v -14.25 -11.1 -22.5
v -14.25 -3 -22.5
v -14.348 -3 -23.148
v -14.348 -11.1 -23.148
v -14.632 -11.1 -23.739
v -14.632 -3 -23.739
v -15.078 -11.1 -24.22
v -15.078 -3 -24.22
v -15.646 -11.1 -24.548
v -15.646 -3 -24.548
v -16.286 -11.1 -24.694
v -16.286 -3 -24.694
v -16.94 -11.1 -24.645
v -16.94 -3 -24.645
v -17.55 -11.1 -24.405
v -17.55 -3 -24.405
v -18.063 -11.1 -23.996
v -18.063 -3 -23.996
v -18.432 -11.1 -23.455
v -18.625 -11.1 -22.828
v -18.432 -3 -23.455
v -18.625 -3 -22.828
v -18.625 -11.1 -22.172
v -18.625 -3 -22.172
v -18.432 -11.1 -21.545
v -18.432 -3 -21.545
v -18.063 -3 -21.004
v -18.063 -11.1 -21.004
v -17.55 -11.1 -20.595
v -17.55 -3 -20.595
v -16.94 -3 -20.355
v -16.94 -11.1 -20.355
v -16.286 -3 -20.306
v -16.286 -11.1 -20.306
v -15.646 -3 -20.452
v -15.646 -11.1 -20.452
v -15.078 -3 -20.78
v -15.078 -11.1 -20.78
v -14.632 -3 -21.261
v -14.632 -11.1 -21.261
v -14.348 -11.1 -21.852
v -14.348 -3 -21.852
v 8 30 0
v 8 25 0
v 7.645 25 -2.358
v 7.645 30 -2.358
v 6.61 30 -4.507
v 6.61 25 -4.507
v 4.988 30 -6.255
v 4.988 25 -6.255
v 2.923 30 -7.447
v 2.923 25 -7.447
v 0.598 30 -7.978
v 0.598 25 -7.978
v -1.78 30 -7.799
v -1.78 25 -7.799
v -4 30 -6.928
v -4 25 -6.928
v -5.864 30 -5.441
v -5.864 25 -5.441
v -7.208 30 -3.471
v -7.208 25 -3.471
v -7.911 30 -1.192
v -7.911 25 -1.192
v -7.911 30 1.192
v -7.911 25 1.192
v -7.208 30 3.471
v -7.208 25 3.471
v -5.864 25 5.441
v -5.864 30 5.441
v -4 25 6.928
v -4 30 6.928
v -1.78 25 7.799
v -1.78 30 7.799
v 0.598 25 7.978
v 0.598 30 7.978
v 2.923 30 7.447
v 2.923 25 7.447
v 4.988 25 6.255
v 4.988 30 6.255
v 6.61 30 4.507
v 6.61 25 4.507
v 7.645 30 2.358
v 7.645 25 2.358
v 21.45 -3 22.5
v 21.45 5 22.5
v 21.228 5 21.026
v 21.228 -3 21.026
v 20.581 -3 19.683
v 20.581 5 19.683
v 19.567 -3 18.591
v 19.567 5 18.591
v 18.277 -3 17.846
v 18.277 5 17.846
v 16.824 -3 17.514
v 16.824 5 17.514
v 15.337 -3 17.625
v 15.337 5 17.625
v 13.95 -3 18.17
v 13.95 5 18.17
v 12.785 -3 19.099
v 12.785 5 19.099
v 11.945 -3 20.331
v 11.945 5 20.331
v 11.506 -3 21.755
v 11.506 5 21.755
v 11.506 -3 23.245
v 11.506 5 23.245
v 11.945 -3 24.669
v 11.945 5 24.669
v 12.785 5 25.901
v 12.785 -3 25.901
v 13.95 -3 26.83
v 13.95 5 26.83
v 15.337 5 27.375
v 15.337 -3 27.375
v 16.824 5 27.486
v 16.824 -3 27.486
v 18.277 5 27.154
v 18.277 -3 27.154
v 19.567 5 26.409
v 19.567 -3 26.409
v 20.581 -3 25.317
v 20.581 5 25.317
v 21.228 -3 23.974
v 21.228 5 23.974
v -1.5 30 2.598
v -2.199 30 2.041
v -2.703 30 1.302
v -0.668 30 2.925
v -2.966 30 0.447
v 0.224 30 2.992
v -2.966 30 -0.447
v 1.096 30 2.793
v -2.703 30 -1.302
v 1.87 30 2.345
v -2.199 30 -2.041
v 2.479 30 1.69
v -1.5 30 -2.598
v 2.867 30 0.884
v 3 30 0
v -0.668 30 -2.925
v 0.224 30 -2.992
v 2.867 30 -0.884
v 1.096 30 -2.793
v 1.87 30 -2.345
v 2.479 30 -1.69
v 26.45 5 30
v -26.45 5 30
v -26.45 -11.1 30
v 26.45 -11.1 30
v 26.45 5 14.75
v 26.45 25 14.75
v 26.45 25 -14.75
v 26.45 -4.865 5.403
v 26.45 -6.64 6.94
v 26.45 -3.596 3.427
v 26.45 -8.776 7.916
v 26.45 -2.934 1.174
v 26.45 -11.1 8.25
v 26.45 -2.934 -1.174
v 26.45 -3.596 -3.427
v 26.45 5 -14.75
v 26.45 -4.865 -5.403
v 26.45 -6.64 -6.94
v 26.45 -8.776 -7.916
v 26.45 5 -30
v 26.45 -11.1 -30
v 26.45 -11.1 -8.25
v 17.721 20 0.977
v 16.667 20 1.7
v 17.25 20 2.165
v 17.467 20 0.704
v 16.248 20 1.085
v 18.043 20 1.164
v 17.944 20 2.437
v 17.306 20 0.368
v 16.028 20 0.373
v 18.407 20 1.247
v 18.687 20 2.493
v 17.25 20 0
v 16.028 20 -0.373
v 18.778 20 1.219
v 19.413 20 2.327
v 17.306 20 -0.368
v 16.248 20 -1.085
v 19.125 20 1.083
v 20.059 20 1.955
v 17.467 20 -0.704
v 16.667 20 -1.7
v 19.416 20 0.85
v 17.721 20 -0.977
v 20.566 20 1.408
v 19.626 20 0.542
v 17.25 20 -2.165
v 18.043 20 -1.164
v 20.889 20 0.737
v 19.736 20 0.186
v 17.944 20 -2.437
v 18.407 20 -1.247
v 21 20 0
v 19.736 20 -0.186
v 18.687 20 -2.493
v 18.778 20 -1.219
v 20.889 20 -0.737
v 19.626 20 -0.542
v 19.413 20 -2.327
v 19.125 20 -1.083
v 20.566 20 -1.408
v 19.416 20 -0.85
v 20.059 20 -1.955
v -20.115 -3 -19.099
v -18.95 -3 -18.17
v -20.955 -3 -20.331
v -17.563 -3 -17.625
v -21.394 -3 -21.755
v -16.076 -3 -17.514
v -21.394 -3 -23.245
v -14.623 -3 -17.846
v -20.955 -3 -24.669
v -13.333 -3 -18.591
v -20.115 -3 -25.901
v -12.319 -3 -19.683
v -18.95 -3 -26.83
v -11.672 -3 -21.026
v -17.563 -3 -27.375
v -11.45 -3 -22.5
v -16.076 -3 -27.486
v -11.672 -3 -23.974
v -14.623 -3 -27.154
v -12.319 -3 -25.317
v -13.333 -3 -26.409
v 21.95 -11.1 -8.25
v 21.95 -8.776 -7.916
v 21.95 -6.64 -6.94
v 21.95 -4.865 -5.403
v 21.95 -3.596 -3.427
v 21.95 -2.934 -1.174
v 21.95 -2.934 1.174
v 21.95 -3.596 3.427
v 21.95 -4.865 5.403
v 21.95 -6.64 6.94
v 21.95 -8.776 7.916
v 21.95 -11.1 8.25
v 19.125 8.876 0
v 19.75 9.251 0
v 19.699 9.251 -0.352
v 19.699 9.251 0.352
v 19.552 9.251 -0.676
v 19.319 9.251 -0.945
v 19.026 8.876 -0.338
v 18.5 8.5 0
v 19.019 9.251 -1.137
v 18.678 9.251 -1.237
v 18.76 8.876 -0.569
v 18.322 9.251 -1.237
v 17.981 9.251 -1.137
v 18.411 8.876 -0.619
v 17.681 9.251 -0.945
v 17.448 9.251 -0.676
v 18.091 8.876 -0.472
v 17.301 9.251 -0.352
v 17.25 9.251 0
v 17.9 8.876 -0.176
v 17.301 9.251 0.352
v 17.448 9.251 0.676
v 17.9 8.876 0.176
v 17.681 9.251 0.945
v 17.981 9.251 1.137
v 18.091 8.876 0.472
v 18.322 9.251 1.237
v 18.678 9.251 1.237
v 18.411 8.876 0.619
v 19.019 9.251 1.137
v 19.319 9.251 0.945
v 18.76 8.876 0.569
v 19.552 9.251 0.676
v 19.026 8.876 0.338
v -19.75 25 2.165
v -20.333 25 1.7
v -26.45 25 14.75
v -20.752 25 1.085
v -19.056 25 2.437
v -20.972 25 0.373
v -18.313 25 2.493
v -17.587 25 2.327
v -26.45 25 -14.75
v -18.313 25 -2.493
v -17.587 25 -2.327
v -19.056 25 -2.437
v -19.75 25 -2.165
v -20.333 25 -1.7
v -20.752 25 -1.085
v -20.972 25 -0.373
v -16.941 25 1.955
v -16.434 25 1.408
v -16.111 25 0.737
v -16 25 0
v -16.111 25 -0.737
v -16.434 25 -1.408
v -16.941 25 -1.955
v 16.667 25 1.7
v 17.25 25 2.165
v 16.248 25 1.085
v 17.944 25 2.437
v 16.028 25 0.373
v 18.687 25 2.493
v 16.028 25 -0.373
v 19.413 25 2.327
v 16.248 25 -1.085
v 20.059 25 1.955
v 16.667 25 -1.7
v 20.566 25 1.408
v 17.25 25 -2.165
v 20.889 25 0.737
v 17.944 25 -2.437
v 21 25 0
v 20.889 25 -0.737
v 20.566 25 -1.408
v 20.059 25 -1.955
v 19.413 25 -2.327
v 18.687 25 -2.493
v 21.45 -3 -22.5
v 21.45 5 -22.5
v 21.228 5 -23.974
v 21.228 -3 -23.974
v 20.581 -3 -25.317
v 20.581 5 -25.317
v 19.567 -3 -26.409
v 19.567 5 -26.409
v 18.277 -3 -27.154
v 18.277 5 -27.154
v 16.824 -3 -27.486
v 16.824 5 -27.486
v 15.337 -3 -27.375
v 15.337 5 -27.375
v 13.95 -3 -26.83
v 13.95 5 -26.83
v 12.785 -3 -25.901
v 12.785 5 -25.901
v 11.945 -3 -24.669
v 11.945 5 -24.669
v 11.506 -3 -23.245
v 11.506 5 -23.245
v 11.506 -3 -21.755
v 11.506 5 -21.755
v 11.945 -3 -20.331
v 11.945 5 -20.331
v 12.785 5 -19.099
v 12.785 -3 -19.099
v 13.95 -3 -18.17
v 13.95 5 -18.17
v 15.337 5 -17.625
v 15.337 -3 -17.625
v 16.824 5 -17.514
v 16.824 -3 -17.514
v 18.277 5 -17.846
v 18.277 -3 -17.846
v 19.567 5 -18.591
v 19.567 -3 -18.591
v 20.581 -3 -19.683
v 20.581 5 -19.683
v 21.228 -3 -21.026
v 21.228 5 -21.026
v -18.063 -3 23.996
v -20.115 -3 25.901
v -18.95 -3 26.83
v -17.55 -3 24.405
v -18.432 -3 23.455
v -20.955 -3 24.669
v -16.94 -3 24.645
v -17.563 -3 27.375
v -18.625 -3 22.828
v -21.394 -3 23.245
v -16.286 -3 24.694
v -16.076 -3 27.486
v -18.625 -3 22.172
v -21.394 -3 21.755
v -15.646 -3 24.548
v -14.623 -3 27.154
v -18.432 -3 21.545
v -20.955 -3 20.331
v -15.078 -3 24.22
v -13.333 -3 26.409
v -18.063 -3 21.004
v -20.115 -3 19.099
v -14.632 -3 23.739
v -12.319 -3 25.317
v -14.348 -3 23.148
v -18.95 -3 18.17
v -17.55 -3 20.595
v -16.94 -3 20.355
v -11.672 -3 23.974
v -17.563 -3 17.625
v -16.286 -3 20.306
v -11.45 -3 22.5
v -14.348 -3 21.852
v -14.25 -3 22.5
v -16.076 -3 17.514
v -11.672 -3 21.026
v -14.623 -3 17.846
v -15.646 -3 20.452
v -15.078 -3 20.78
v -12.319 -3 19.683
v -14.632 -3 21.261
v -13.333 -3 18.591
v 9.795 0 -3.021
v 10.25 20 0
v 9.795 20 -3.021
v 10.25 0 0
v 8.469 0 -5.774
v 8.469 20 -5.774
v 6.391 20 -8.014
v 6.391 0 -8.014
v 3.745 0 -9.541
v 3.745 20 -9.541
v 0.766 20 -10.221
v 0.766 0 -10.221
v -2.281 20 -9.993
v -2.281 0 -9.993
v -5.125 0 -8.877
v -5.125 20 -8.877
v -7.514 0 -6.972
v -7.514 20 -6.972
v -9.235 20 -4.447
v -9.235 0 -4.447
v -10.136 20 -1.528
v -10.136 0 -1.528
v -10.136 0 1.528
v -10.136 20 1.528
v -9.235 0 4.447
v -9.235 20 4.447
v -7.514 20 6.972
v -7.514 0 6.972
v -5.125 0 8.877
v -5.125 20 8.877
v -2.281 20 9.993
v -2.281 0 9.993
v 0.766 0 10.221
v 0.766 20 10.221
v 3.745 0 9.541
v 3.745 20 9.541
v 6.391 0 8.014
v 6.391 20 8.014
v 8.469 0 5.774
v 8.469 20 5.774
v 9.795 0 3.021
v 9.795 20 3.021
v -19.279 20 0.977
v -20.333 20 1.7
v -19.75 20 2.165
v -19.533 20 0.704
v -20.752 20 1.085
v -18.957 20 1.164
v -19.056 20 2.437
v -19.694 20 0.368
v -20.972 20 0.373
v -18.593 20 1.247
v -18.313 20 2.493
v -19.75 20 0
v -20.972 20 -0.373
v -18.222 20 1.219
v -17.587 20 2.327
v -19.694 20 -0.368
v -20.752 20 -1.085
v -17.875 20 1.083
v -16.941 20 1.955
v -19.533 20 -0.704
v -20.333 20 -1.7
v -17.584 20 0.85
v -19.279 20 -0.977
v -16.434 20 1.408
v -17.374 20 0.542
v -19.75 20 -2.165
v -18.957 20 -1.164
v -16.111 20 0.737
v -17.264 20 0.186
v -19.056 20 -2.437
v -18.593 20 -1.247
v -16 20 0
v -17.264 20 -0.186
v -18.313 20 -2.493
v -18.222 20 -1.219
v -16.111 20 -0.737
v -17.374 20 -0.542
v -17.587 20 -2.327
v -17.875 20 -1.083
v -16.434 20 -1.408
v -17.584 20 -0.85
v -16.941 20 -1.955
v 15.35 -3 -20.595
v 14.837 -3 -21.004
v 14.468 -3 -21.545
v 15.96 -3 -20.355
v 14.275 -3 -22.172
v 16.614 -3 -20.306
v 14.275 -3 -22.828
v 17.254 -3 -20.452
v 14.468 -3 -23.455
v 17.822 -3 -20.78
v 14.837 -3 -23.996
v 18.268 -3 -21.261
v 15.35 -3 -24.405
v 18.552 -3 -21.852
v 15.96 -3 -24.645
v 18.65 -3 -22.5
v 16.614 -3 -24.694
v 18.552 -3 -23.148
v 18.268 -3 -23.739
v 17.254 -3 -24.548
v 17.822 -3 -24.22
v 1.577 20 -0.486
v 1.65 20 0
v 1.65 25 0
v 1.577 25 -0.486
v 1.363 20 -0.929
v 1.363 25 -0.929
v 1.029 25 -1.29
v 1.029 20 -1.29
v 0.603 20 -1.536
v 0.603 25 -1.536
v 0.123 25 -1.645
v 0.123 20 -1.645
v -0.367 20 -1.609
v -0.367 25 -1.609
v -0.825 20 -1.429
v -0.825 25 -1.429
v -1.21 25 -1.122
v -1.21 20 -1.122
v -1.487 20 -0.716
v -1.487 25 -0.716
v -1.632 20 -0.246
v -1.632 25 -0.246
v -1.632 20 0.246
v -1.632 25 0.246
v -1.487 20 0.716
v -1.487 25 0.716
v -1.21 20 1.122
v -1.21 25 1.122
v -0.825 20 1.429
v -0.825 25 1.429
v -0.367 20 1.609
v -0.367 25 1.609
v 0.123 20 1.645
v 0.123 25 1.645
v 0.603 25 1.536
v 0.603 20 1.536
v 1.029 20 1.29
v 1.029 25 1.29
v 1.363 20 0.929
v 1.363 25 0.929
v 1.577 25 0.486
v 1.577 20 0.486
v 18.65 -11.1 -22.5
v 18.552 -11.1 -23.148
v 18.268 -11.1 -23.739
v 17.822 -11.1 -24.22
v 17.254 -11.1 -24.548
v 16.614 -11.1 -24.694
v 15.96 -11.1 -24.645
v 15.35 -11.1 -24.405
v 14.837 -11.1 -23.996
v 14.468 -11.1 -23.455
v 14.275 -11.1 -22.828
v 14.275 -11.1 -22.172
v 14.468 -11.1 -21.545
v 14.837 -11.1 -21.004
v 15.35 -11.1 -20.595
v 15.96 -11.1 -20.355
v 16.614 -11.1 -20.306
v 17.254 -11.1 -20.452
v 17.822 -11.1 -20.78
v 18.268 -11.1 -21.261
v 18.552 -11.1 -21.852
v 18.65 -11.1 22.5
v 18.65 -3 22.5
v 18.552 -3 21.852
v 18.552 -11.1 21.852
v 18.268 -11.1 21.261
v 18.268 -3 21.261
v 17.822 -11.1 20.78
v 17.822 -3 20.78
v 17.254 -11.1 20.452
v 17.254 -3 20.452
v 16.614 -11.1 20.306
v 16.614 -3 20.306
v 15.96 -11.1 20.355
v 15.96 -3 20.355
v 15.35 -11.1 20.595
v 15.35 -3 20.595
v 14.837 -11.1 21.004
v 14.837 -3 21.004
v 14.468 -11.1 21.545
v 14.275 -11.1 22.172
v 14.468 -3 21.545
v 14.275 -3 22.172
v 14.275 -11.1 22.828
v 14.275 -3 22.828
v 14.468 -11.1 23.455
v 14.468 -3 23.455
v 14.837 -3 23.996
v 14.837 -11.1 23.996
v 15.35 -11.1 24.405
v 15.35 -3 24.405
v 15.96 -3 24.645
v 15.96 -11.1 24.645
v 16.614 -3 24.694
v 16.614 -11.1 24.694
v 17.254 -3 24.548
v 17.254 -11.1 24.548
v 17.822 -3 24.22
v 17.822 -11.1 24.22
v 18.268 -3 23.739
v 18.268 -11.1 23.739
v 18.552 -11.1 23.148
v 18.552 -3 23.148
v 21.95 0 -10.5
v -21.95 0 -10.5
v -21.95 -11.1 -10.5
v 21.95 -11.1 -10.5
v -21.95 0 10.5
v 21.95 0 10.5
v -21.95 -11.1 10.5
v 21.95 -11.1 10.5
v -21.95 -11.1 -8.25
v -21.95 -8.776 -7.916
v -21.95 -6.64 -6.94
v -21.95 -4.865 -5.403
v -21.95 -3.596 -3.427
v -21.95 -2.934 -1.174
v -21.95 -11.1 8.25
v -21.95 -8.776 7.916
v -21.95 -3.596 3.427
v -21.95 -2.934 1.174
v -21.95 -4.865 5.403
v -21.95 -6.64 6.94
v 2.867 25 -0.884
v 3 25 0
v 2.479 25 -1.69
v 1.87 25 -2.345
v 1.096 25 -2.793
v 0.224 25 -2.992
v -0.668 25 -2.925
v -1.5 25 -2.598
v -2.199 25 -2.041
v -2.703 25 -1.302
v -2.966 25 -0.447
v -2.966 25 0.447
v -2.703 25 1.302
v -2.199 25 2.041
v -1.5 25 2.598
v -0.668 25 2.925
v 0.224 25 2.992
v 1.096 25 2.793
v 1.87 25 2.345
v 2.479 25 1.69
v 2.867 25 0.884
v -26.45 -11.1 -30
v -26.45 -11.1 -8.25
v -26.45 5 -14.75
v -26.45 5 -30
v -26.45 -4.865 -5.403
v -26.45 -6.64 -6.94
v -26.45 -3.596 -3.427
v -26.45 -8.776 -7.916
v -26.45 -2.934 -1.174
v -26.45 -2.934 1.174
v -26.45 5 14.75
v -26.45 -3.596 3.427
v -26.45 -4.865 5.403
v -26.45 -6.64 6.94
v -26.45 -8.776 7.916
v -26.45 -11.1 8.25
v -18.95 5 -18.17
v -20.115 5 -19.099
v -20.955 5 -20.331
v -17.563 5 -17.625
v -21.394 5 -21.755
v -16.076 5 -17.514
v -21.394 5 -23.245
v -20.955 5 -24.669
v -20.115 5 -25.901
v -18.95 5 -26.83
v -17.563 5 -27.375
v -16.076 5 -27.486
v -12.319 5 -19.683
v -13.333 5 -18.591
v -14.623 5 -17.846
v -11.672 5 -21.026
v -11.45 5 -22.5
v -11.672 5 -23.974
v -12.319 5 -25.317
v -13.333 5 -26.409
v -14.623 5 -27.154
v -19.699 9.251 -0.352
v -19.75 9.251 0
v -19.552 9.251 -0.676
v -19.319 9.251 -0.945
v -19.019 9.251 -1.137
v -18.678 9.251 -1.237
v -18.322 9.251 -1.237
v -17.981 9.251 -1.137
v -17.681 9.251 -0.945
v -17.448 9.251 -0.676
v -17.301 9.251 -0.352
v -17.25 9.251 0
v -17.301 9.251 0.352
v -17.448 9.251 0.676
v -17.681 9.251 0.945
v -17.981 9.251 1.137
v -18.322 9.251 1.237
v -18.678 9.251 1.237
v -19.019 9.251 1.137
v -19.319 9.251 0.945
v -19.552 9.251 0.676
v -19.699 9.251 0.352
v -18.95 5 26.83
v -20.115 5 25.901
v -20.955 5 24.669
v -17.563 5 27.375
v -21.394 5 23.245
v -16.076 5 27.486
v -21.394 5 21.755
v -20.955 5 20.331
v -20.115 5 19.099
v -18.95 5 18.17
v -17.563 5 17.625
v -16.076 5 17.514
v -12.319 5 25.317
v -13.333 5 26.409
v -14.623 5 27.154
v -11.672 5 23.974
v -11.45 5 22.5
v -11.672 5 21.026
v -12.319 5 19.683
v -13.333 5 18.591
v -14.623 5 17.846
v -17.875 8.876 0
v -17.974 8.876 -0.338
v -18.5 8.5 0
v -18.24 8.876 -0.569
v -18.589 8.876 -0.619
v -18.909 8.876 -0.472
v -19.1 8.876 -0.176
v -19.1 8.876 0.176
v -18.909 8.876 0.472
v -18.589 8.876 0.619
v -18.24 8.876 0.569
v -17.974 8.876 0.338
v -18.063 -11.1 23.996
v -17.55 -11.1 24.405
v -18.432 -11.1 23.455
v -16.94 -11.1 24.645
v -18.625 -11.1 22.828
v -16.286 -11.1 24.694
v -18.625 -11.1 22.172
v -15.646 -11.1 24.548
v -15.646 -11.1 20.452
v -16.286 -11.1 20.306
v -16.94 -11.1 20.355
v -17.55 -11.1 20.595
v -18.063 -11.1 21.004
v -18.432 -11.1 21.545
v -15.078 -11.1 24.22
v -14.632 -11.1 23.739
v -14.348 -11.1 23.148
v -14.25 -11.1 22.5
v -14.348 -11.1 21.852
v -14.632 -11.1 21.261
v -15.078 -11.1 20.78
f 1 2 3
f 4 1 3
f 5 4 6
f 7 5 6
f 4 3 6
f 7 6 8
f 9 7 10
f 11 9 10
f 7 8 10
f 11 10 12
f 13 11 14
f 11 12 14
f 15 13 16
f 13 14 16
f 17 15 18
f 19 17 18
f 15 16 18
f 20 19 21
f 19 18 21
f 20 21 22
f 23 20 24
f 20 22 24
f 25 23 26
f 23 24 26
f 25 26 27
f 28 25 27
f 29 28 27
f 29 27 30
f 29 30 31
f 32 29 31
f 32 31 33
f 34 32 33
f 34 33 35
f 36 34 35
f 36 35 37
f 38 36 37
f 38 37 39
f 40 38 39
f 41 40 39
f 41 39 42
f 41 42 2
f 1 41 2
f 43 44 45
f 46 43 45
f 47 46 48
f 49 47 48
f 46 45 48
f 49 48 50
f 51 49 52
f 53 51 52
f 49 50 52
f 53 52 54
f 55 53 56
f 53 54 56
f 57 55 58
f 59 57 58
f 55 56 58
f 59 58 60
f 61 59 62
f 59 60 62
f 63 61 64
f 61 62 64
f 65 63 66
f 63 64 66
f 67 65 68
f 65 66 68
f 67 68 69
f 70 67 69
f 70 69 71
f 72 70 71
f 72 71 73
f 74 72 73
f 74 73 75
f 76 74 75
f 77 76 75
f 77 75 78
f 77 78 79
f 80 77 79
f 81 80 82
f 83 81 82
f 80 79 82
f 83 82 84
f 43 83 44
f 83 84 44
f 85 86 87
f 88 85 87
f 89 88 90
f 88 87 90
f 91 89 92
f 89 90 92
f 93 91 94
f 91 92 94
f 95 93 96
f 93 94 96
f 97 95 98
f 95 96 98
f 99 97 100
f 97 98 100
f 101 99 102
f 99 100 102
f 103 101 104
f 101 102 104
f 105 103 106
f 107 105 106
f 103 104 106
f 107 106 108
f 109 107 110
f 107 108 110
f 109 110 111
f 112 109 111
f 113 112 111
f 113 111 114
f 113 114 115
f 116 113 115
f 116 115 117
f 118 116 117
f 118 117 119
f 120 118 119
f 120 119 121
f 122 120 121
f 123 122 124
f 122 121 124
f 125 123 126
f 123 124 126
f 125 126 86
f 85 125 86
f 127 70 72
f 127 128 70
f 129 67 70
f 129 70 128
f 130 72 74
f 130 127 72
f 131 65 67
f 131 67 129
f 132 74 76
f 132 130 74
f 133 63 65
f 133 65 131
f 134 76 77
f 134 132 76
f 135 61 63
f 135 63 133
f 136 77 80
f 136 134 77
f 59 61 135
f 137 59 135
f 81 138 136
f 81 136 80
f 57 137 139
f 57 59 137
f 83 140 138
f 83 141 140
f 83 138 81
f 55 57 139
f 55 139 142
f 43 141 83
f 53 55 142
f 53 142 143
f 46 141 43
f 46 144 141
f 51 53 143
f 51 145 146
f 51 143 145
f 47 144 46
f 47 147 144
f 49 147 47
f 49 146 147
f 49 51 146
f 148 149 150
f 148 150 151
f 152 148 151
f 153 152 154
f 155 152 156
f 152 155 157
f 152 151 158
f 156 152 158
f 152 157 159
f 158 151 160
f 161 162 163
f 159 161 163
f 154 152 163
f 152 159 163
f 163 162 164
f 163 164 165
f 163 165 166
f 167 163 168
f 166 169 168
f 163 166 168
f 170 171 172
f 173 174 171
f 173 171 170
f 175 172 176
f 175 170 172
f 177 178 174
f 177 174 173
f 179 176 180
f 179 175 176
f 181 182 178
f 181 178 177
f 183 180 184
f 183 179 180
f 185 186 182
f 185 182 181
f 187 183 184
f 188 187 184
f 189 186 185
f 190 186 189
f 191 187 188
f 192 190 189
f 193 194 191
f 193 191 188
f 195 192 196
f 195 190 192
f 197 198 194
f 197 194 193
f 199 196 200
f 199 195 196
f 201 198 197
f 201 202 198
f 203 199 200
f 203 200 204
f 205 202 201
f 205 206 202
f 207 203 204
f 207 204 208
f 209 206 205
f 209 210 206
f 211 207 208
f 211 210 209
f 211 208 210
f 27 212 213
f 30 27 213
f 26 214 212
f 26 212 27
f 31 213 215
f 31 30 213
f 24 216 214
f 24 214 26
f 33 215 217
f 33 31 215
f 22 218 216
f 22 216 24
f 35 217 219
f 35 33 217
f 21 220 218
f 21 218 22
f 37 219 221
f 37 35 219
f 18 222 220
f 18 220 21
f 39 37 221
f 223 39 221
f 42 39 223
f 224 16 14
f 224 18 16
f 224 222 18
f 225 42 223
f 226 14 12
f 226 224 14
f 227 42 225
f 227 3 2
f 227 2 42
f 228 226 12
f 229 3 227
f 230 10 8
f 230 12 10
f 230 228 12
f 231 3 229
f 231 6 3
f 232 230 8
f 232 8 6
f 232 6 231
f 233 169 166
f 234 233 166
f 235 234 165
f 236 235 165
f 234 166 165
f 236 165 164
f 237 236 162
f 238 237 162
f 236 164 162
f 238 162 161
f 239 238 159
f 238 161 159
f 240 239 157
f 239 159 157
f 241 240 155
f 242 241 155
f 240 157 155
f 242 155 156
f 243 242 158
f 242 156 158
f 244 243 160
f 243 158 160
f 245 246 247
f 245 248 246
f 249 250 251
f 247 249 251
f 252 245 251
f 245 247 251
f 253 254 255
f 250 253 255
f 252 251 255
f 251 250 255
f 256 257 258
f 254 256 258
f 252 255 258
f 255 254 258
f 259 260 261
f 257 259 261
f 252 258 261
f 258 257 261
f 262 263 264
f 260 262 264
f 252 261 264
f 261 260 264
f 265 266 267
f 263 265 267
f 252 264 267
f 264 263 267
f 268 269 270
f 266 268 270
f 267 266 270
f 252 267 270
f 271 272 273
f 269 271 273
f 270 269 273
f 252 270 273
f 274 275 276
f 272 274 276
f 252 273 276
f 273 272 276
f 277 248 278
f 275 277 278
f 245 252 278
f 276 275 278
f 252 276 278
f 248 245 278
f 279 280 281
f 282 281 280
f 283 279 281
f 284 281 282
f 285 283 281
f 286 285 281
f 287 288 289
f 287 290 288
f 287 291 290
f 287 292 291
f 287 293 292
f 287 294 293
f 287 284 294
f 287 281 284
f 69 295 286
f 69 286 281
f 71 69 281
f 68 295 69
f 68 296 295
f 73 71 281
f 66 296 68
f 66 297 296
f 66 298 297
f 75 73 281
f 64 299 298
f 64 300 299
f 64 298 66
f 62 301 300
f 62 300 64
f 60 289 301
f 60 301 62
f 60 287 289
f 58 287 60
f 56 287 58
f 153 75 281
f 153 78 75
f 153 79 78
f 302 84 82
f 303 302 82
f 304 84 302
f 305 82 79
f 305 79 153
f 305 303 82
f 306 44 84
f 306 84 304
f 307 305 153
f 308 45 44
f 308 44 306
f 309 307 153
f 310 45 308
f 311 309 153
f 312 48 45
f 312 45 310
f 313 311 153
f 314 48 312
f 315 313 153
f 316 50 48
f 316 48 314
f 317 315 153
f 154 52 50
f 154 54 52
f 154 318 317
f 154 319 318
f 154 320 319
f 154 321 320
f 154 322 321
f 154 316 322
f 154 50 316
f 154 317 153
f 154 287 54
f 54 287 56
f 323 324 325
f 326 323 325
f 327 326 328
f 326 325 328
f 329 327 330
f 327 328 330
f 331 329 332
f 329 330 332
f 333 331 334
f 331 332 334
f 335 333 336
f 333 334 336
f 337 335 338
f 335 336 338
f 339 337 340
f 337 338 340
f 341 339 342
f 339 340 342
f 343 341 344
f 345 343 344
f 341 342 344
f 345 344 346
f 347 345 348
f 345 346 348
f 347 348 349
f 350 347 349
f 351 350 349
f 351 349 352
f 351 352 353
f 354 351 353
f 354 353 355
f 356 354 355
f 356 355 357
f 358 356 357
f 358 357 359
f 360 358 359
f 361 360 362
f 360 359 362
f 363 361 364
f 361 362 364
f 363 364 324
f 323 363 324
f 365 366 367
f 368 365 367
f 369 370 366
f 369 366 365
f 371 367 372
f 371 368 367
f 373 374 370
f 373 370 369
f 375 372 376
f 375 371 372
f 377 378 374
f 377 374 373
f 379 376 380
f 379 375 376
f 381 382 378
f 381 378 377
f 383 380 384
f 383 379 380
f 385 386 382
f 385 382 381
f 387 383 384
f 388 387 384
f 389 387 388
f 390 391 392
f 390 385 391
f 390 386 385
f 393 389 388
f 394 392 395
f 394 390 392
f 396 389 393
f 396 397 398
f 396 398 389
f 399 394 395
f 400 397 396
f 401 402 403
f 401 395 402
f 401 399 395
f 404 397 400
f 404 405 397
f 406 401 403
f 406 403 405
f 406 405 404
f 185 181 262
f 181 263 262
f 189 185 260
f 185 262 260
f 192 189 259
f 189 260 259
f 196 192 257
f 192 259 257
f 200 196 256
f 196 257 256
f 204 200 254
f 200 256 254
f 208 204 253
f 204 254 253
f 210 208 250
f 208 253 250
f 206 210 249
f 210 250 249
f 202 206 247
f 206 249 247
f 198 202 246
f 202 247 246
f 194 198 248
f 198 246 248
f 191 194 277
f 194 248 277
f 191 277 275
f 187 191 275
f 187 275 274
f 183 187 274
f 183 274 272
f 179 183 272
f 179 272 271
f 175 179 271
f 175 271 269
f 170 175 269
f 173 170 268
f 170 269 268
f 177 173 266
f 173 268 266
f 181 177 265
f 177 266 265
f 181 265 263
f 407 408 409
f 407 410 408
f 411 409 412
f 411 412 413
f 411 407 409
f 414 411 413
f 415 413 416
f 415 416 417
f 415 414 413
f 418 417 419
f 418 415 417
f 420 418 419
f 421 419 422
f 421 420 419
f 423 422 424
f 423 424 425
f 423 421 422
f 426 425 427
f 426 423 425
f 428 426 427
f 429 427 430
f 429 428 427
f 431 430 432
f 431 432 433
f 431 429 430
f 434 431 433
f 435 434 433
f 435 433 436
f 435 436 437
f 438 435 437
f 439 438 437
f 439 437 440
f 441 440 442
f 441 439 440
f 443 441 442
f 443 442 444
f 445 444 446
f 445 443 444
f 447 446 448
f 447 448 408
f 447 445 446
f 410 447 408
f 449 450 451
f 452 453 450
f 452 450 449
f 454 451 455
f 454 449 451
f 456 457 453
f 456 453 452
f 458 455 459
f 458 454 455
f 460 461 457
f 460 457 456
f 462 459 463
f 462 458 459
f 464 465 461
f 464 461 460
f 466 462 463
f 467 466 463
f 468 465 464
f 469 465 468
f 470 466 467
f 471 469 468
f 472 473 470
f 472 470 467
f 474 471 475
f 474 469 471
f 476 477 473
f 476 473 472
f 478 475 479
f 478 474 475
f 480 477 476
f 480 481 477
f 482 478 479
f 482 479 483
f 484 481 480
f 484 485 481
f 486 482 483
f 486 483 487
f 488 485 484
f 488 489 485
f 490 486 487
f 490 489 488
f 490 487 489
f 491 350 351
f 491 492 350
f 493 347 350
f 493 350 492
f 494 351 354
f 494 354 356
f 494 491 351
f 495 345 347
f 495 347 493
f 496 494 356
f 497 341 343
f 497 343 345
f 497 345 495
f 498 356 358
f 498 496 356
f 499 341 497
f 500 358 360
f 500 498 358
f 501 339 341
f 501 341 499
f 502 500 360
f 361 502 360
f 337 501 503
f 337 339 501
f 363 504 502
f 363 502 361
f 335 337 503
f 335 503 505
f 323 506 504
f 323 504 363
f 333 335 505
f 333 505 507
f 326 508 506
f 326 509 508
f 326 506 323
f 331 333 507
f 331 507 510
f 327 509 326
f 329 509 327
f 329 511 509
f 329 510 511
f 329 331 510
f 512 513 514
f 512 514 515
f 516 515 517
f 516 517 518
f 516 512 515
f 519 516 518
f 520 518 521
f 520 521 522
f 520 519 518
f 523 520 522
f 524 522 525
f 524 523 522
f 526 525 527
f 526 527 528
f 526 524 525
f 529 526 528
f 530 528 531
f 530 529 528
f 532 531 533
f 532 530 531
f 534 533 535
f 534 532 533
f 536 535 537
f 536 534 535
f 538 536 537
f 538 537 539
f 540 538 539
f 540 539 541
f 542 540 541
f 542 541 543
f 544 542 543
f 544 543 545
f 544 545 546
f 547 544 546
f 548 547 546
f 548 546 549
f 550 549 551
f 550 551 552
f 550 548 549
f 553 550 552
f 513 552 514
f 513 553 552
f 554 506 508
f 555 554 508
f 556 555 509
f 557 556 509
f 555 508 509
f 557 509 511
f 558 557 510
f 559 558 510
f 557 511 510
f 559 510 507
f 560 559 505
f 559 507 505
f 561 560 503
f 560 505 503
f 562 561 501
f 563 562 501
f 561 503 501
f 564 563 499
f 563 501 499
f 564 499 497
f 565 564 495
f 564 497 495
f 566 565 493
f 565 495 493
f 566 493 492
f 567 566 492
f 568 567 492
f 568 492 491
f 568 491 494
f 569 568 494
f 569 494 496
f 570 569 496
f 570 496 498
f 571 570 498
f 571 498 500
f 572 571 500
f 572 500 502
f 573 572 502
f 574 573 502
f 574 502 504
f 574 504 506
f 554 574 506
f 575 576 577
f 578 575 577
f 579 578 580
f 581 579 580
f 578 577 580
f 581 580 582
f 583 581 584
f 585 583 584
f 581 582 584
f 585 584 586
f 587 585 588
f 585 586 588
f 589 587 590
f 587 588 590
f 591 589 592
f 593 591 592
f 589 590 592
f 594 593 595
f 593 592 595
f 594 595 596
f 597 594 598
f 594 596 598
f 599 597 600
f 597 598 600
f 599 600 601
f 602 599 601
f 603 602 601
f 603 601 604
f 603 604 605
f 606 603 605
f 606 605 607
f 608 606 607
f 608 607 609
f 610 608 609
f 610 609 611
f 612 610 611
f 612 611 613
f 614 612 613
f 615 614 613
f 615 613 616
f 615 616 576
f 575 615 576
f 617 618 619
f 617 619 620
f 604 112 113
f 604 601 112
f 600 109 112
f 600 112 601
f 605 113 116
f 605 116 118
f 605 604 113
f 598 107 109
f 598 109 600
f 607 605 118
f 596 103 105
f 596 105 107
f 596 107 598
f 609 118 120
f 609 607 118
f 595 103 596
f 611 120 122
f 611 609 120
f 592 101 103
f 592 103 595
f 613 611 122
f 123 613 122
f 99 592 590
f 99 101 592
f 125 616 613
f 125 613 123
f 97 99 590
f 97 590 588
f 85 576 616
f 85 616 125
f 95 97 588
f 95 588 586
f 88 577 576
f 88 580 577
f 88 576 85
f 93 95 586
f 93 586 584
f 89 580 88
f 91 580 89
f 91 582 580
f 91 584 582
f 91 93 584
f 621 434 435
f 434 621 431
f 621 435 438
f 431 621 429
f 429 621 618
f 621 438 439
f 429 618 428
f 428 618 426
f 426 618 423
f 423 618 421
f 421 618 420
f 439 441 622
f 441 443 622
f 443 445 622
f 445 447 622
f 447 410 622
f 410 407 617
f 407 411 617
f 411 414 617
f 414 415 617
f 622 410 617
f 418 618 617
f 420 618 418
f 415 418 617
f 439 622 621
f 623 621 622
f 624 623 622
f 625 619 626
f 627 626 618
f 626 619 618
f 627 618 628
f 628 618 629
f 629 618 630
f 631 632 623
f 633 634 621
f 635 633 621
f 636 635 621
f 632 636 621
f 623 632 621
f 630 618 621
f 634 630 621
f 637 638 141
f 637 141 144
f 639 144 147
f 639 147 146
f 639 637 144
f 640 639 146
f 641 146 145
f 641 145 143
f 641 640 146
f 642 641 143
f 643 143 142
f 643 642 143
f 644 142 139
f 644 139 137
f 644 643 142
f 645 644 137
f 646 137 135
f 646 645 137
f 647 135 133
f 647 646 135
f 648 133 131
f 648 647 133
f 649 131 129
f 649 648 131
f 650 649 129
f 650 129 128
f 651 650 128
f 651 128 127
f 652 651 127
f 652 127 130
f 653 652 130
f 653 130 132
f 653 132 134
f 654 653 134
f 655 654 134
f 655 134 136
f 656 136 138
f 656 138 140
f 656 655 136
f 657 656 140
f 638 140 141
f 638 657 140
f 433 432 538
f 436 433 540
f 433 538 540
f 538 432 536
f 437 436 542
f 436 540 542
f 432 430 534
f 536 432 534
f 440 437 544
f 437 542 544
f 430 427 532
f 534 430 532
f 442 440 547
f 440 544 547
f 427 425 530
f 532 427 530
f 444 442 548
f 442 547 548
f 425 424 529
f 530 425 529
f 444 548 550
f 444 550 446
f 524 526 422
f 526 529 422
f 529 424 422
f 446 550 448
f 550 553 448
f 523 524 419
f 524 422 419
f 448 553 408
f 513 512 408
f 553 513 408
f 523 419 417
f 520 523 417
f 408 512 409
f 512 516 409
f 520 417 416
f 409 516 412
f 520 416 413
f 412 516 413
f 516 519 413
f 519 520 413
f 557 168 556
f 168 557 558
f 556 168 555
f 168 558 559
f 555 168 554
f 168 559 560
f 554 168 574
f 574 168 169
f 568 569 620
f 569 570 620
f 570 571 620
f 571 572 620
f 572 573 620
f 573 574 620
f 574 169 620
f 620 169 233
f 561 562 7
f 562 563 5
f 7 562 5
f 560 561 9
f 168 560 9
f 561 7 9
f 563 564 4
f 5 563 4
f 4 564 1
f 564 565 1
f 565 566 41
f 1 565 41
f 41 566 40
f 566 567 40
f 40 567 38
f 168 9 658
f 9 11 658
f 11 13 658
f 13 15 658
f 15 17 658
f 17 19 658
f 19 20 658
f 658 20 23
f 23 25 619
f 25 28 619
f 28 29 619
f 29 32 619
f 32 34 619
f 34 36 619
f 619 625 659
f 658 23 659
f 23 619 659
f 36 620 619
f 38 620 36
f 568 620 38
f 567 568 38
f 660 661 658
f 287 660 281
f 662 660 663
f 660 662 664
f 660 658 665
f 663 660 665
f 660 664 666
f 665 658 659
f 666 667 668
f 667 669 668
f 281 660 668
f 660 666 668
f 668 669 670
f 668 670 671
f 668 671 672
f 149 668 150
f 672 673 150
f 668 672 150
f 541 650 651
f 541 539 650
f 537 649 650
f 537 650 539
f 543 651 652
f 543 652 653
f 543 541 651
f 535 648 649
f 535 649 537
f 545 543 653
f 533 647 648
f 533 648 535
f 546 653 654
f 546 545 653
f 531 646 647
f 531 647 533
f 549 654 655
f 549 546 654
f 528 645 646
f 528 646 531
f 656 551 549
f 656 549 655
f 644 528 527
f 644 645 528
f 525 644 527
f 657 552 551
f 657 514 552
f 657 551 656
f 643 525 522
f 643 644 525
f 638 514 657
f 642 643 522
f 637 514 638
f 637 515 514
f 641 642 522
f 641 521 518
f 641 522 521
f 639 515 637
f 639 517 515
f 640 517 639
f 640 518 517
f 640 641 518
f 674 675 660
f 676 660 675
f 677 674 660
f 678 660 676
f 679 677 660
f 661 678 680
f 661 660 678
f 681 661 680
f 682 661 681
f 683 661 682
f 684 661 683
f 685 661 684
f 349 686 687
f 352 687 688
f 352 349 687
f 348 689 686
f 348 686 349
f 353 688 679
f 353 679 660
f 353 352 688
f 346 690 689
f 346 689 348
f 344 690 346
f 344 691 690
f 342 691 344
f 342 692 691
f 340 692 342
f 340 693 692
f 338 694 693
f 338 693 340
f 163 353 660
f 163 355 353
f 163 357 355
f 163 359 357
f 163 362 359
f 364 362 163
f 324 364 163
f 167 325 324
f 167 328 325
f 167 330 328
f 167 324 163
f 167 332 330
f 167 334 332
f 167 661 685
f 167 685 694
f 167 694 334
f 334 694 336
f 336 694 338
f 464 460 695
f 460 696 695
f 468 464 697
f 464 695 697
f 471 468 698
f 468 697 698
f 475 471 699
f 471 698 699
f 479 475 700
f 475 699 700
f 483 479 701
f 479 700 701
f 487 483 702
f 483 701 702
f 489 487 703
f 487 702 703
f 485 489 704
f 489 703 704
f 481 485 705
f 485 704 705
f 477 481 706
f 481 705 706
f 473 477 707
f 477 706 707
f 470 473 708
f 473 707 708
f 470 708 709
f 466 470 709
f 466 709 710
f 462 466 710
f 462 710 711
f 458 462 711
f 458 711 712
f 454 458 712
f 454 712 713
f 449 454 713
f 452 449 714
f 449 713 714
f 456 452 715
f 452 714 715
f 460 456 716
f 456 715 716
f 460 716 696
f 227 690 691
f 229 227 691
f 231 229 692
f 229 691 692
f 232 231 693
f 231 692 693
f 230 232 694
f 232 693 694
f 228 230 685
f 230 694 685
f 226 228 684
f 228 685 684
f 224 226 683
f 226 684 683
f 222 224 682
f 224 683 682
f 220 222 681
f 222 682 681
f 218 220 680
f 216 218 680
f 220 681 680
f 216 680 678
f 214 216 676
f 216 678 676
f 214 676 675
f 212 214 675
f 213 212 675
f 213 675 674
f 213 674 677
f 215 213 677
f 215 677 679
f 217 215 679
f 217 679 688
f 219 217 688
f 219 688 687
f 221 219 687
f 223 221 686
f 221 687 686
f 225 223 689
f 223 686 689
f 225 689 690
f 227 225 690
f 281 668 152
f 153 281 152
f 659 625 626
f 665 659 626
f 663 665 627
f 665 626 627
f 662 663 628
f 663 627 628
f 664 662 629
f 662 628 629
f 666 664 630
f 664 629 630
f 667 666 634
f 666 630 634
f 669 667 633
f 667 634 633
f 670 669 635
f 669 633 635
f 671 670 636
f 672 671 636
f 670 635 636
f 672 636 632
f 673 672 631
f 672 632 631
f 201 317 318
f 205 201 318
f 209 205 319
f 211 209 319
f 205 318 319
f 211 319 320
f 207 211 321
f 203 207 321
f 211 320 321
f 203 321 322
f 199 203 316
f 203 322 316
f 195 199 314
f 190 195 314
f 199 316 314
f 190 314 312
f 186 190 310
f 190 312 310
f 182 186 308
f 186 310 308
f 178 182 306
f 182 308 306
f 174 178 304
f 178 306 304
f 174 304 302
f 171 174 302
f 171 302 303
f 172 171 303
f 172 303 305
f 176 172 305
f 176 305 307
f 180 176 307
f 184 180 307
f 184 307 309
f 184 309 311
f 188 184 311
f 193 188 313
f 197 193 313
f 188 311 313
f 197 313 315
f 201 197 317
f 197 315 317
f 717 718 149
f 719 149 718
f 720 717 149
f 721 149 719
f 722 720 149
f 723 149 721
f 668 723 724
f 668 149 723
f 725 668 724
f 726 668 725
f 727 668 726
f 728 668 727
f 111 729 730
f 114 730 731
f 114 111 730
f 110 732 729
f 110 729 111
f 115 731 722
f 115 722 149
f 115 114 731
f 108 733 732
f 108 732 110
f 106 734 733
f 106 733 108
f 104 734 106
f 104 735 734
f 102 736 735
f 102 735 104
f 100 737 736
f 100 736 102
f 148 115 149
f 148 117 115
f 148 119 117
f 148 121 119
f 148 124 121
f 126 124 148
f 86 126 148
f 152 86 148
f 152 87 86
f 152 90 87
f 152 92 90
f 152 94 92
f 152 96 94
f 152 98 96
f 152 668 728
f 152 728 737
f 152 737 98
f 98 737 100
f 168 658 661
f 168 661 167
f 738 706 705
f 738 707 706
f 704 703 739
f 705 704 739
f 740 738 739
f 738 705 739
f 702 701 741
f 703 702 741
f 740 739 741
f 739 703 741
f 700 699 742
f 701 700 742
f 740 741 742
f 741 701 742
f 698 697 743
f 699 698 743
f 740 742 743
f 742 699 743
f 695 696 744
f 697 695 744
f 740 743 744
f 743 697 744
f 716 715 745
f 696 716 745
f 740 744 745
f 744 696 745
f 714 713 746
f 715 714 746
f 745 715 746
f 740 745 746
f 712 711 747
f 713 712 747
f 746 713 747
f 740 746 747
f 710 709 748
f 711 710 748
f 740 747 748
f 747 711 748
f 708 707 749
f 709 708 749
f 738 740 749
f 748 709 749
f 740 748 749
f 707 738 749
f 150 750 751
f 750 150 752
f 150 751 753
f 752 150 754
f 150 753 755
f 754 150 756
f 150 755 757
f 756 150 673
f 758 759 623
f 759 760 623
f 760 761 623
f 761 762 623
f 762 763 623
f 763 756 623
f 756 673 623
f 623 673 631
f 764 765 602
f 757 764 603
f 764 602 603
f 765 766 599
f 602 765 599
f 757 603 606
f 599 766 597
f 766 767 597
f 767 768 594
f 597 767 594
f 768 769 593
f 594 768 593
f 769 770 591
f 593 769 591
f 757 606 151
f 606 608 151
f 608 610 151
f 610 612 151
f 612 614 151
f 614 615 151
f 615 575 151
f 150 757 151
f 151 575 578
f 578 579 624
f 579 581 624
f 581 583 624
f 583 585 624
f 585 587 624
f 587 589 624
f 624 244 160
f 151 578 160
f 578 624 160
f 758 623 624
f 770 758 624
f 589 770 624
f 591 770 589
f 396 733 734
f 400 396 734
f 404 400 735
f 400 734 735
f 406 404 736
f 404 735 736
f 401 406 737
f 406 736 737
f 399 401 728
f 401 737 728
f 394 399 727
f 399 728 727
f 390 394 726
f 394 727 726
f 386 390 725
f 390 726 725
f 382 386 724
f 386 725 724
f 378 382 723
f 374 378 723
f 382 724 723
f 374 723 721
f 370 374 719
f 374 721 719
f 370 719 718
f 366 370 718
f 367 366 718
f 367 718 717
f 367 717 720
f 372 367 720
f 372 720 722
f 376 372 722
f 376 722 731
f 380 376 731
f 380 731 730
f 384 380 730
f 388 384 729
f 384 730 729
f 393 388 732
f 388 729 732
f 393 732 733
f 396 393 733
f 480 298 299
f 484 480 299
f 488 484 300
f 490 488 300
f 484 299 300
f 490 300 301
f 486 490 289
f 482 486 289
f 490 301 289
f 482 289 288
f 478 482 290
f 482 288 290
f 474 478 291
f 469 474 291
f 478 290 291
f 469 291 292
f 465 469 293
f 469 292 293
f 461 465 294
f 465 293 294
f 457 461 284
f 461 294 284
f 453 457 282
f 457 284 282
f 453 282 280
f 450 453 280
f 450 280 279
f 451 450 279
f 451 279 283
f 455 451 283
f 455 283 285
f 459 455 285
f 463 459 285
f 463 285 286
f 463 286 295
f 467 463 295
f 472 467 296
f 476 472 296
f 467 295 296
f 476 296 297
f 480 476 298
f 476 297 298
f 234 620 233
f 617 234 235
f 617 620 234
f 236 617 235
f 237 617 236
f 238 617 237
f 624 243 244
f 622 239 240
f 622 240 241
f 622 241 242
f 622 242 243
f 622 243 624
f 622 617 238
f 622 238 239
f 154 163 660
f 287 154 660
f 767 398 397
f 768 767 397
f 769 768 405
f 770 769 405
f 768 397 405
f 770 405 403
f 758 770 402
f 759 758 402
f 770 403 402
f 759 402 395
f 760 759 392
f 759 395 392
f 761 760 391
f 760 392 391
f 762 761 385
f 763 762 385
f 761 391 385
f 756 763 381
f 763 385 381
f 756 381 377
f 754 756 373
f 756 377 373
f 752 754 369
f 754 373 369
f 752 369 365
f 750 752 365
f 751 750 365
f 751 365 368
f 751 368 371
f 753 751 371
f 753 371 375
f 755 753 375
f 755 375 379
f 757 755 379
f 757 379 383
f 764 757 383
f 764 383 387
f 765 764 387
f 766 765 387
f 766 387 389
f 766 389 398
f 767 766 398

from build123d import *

# Parameters (mm, degrees)
SKETCH1_W             = 52.9
SKETCH1_H             = 30
SKETCH1_R             = 10.25
BOSS_EXTRUDE1_DEPTH   = 5
SKETCH2_W             = 52.9
SKETCH2_H             = 30
SKETCH2_W_2           = 43.9
SKETCH2_H_2           = 21
BOSS_EXTRUDE2_DEPTH   = 11.1
SKETCH3_R             = 8.25
CUT_EXTRUDE1_DEPTH    = 53.9
SKETCH4_W             = 52.9
SKETCH4_H             = 5
BOSS_EXTRUDE3_DEPTH   = 15
SKETCH5_W             = 52.9
SKETCH5_H             = 5
BOSS_EXTRUDE4_DEPTH   = 15
SKETCH7_R             = 14.75
SKETCH7_R_2           = 10.25
BOSS_EXTRUDE5_DEPTH   = 15
SKETCH8_R             = 14.75
SKETCH8_R_2           = 1.65
BOSS_EXTRUDE6_DEPTH   = 5
SKETCH9_R             = 8
SKETCH9_R_2           = 3
BOSS_EXTRUDE7_DEPTH   = 5
SKETCH10_W            = 52.9
SKETCH10_H            = 15
BOSS_EXTRUDE8_DEPTH   = 11.1
SKETCH12_R            = 5
CUT_EXTRUDE2_DEPTH    = 8
SKETCH13_R            = 2.2
CUT_EXTRUDE3_DEPTH    = 9.1
BOSS_EXTRUDE11_DEPTH  = 20
SKETCH16_R            = 2.5
CUT_EXTRUDE4_DEPTH    = 5
M3_TAPPED_HOLE1_D     = 2.5
M3_TAPPED_HOLE1_DEPTH = 10.748924226
M3_TAPPED_HOLE1_TIP   = 0.751075774


with BuildPart() as part:
    # Sketch1 → Boss-Extrude1 (new body)
    with BuildSketch(Plane(origin=(0, 0, 0), x_dir=(1, 0, 0), z_dir=(0, 1, 0))):
        Rectangle(SKETCH1_W, SKETCH1_H)
        Circle(SKETCH1_R, mode=Mode.SUBTRACT)
    extrude(amount=BOSS_EXTRUDE1_DEPTH)

    # Sketch2 → Boss-Extrude2 (add)
    with BuildSketch(Plane.XZ):
        Rectangle(SKETCH2_W, SKETCH2_H)
        Rectangle(SKETCH2_W_2, SKETCH2_H_2, mode=Mode.SUBTRACT)
    extrude(amount=BOSS_EXTRUDE2_DEPTH)

    # Sketch3 → Cut-Extrude1 (cut, through all)
    with BuildSketch(Plane(origin=(26.45, 0, 0), x_dir=(0, 0, -1), z_dir=(1, 0, 0))):
        with Locations((0, -11.1)):
            Circle(SKETCH3_R)
    extrude(amount=-CUT_EXTRUDE1_DEPTH, mode=Mode.SUBTRACT)

    # Sketch4 → Boss-Extrude3 (add)
    with BuildSketch(Plane(origin=(0, 0, -15), x_dir=(-1, 0, 0), z_dir=(0, 0, -1))):
        with Locations((0, -8.6)):
            Rectangle(SKETCH4_W, SKETCH4_H)
    extrude(amount=BOSS_EXTRUDE3_DEPTH)

    # Sketch5 → Boss-Extrude4 (add)
    with BuildSketch(Plane.XY.offset(15)):
        with Locations((0, -8.6)):
            Rectangle(SKETCH5_W, SKETCH5_H)
    extrude(amount=BOSS_EXTRUDE4_DEPTH)

    # Sketch7 → Boss-Extrude5 (add)
    with BuildSketch(Plane(origin=(0, 5, 0), x_dir=(1, 0, 0), z_dir=(0, 1, 0))):
        Circle(SKETCH7_R)
        Circle(SKETCH7_R_2, mode=Mode.SUBTRACT)
    extrude(amount=BOSS_EXTRUDE5_DEPTH)

    # Sketch8 → Boss-Extrude6 (add)
    with BuildSketch(Plane(origin=(0, 20, 0), x_dir=(1, 0, 0), z_dir=(0, 1, 0))):
        Circle(SKETCH8_R)
        Circle(SKETCH8_R_2, mode=Mode.SUBTRACT)
    extrude(amount=BOSS_EXTRUDE6_DEPTH)

    # Sketch9 → Boss-Extrude7 (add)
    with BuildSketch(Plane(origin=(0, 25, 0), x_dir=(1, 0, 0), z_dir=(0, 1, 0))):
        Circle(SKETCH9_R)
        Circle(SKETCH9_R_2, mode=Mode.SUBTRACT)
    extrude(amount=BOSS_EXTRUDE7_DEPTH)

    # Sketch10 → Boss-Extrude8 (add)
    with BuildSketch(Plane(origin=(0, -6.1, 0), x_dir=(1, 0, 0), z_dir=(0, 1, 0))):
        with Locations((0, 22.5)):
            Rectangle(SKETCH10_W, SKETCH10_H)
        with Locations((0, -22.5)):
            Rectangle(SKETCH10_W, SKETCH10_H)
    extrude(amount=BOSS_EXTRUDE8_DEPTH)

    # Sketch12 → Cut-Extrude2 (cut)
    with BuildSketch(Plane(origin=(0, 5, 0), x_dir=(1, 0, 0), z_dir=(0, 1, 0))):
        with Locations((-16.45, -22.5)):
            Circle(SKETCH12_R)
        with Locations((16.45, -22.5)):
            Circle(SKETCH12_R)
        with Locations((16.45, 22.5)):
            Circle(SKETCH12_R)
        with Locations((-16.45, 22.5)):
            Circle(SKETCH12_R)
    extrude(amount=-CUT_EXTRUDE2_DEPTH, mode=Mode.SUBTRACT)

    # Sketch13 → Cut-Extrude3 (cut, through all)
    with BuildSketch(Plane(origin=(0, -3, 0), x_dir=(1, 0, 0), z_dir=(0, 1, 0))):
        with Locations((-16.45, -22.5)):
            Circle(SKETCH13_R)
        with Locations((-16.45, 22.5)):
            Circle(SKETCH13_R)
        with Locations((16.45, 22.5)):
            Circle(SKETCH13_R)
        with Locations((16.45, -22.5)):
            Circle(SKETCH13_R)
    extrude(amount=-CUT_EXTRUDE3_DEPTH, mode=Mode.SUBTRACT)

    # Sketch14 → Boss-Extrude11 (add)
    with BuildSketch(Plane(origin=(0, 5, 0), x_dir=(1, 0, 0), z_dir=(0, 1, 0))):
        with BuildLine():
            Line((-26.45, 14.75), (-26.45, -14.75))
            Line((-26.45, -14.75), (4e-09, -14.75))
            ThreePointArc((4e-09, -14.75), (-14.75, -5e-09), (-6e-09, 14.75))
            Line((-6e-09, 14.75), (-26.45, 14.75))
        make_face()
        with BuildLine():
            ThreePointArc((14.75, 0), (10.429825024, -10.429825021), (4e-09, -14.75))
            Line((4e-09, -14.75), (26.45, -14.75))
            Line((26.45, -14.75), (26.45, 14.75))
            Line((26.45, 14.75), (-6e-09, 14.75))
            ThreePointArc((-6e-09, 14.75), (10.42982502, 10.429825025), (14.75, 0))
        make_face()
    extrude(amount=BOSS_EXTRUDE11_DEPTH)

    # Sketch16 → Cut-Extrude4 (cut)
    with BuildSketch(Plane(origin=(0, 25, 0), x_dir=(1, 0, 0), z_dir=(0, 1, 0))):
        with Locations((18.5, 0)):
            Circle(SKETCH16_R)
        with Locations((-18.5, 0)):
            Circle(SKETCH16_R)
    extrude(amount=-CUT_EXTRUDE4_DEPTH, mode=Mode.SUBTRACT)

    # M3 Tapped Hole1
    with Locations(Plane(origin=(0, 20, 0), x_dir=(1, 0, 0), z_dir=(0, 1, 0))):
        with Locations((-18.5, 0), (18.5, 0)):
            Hole(M3_TAPPED_HOLE1_D / 2, depth=M3_TAPPED_HOLE1_DEPTH)
            with Locations((0, 0, -(M3_TAPPED_HOLE1_DEPTH + M3_TAPPED_HOLE1_TIP / 2))):  # 118° drill point
                Cone(0, M3_TAPPED_HOLE1_D / 2, M3_TAPPED_HOLE1_TIP, mode=Mode.SUBTRACT)


solid = part.part
